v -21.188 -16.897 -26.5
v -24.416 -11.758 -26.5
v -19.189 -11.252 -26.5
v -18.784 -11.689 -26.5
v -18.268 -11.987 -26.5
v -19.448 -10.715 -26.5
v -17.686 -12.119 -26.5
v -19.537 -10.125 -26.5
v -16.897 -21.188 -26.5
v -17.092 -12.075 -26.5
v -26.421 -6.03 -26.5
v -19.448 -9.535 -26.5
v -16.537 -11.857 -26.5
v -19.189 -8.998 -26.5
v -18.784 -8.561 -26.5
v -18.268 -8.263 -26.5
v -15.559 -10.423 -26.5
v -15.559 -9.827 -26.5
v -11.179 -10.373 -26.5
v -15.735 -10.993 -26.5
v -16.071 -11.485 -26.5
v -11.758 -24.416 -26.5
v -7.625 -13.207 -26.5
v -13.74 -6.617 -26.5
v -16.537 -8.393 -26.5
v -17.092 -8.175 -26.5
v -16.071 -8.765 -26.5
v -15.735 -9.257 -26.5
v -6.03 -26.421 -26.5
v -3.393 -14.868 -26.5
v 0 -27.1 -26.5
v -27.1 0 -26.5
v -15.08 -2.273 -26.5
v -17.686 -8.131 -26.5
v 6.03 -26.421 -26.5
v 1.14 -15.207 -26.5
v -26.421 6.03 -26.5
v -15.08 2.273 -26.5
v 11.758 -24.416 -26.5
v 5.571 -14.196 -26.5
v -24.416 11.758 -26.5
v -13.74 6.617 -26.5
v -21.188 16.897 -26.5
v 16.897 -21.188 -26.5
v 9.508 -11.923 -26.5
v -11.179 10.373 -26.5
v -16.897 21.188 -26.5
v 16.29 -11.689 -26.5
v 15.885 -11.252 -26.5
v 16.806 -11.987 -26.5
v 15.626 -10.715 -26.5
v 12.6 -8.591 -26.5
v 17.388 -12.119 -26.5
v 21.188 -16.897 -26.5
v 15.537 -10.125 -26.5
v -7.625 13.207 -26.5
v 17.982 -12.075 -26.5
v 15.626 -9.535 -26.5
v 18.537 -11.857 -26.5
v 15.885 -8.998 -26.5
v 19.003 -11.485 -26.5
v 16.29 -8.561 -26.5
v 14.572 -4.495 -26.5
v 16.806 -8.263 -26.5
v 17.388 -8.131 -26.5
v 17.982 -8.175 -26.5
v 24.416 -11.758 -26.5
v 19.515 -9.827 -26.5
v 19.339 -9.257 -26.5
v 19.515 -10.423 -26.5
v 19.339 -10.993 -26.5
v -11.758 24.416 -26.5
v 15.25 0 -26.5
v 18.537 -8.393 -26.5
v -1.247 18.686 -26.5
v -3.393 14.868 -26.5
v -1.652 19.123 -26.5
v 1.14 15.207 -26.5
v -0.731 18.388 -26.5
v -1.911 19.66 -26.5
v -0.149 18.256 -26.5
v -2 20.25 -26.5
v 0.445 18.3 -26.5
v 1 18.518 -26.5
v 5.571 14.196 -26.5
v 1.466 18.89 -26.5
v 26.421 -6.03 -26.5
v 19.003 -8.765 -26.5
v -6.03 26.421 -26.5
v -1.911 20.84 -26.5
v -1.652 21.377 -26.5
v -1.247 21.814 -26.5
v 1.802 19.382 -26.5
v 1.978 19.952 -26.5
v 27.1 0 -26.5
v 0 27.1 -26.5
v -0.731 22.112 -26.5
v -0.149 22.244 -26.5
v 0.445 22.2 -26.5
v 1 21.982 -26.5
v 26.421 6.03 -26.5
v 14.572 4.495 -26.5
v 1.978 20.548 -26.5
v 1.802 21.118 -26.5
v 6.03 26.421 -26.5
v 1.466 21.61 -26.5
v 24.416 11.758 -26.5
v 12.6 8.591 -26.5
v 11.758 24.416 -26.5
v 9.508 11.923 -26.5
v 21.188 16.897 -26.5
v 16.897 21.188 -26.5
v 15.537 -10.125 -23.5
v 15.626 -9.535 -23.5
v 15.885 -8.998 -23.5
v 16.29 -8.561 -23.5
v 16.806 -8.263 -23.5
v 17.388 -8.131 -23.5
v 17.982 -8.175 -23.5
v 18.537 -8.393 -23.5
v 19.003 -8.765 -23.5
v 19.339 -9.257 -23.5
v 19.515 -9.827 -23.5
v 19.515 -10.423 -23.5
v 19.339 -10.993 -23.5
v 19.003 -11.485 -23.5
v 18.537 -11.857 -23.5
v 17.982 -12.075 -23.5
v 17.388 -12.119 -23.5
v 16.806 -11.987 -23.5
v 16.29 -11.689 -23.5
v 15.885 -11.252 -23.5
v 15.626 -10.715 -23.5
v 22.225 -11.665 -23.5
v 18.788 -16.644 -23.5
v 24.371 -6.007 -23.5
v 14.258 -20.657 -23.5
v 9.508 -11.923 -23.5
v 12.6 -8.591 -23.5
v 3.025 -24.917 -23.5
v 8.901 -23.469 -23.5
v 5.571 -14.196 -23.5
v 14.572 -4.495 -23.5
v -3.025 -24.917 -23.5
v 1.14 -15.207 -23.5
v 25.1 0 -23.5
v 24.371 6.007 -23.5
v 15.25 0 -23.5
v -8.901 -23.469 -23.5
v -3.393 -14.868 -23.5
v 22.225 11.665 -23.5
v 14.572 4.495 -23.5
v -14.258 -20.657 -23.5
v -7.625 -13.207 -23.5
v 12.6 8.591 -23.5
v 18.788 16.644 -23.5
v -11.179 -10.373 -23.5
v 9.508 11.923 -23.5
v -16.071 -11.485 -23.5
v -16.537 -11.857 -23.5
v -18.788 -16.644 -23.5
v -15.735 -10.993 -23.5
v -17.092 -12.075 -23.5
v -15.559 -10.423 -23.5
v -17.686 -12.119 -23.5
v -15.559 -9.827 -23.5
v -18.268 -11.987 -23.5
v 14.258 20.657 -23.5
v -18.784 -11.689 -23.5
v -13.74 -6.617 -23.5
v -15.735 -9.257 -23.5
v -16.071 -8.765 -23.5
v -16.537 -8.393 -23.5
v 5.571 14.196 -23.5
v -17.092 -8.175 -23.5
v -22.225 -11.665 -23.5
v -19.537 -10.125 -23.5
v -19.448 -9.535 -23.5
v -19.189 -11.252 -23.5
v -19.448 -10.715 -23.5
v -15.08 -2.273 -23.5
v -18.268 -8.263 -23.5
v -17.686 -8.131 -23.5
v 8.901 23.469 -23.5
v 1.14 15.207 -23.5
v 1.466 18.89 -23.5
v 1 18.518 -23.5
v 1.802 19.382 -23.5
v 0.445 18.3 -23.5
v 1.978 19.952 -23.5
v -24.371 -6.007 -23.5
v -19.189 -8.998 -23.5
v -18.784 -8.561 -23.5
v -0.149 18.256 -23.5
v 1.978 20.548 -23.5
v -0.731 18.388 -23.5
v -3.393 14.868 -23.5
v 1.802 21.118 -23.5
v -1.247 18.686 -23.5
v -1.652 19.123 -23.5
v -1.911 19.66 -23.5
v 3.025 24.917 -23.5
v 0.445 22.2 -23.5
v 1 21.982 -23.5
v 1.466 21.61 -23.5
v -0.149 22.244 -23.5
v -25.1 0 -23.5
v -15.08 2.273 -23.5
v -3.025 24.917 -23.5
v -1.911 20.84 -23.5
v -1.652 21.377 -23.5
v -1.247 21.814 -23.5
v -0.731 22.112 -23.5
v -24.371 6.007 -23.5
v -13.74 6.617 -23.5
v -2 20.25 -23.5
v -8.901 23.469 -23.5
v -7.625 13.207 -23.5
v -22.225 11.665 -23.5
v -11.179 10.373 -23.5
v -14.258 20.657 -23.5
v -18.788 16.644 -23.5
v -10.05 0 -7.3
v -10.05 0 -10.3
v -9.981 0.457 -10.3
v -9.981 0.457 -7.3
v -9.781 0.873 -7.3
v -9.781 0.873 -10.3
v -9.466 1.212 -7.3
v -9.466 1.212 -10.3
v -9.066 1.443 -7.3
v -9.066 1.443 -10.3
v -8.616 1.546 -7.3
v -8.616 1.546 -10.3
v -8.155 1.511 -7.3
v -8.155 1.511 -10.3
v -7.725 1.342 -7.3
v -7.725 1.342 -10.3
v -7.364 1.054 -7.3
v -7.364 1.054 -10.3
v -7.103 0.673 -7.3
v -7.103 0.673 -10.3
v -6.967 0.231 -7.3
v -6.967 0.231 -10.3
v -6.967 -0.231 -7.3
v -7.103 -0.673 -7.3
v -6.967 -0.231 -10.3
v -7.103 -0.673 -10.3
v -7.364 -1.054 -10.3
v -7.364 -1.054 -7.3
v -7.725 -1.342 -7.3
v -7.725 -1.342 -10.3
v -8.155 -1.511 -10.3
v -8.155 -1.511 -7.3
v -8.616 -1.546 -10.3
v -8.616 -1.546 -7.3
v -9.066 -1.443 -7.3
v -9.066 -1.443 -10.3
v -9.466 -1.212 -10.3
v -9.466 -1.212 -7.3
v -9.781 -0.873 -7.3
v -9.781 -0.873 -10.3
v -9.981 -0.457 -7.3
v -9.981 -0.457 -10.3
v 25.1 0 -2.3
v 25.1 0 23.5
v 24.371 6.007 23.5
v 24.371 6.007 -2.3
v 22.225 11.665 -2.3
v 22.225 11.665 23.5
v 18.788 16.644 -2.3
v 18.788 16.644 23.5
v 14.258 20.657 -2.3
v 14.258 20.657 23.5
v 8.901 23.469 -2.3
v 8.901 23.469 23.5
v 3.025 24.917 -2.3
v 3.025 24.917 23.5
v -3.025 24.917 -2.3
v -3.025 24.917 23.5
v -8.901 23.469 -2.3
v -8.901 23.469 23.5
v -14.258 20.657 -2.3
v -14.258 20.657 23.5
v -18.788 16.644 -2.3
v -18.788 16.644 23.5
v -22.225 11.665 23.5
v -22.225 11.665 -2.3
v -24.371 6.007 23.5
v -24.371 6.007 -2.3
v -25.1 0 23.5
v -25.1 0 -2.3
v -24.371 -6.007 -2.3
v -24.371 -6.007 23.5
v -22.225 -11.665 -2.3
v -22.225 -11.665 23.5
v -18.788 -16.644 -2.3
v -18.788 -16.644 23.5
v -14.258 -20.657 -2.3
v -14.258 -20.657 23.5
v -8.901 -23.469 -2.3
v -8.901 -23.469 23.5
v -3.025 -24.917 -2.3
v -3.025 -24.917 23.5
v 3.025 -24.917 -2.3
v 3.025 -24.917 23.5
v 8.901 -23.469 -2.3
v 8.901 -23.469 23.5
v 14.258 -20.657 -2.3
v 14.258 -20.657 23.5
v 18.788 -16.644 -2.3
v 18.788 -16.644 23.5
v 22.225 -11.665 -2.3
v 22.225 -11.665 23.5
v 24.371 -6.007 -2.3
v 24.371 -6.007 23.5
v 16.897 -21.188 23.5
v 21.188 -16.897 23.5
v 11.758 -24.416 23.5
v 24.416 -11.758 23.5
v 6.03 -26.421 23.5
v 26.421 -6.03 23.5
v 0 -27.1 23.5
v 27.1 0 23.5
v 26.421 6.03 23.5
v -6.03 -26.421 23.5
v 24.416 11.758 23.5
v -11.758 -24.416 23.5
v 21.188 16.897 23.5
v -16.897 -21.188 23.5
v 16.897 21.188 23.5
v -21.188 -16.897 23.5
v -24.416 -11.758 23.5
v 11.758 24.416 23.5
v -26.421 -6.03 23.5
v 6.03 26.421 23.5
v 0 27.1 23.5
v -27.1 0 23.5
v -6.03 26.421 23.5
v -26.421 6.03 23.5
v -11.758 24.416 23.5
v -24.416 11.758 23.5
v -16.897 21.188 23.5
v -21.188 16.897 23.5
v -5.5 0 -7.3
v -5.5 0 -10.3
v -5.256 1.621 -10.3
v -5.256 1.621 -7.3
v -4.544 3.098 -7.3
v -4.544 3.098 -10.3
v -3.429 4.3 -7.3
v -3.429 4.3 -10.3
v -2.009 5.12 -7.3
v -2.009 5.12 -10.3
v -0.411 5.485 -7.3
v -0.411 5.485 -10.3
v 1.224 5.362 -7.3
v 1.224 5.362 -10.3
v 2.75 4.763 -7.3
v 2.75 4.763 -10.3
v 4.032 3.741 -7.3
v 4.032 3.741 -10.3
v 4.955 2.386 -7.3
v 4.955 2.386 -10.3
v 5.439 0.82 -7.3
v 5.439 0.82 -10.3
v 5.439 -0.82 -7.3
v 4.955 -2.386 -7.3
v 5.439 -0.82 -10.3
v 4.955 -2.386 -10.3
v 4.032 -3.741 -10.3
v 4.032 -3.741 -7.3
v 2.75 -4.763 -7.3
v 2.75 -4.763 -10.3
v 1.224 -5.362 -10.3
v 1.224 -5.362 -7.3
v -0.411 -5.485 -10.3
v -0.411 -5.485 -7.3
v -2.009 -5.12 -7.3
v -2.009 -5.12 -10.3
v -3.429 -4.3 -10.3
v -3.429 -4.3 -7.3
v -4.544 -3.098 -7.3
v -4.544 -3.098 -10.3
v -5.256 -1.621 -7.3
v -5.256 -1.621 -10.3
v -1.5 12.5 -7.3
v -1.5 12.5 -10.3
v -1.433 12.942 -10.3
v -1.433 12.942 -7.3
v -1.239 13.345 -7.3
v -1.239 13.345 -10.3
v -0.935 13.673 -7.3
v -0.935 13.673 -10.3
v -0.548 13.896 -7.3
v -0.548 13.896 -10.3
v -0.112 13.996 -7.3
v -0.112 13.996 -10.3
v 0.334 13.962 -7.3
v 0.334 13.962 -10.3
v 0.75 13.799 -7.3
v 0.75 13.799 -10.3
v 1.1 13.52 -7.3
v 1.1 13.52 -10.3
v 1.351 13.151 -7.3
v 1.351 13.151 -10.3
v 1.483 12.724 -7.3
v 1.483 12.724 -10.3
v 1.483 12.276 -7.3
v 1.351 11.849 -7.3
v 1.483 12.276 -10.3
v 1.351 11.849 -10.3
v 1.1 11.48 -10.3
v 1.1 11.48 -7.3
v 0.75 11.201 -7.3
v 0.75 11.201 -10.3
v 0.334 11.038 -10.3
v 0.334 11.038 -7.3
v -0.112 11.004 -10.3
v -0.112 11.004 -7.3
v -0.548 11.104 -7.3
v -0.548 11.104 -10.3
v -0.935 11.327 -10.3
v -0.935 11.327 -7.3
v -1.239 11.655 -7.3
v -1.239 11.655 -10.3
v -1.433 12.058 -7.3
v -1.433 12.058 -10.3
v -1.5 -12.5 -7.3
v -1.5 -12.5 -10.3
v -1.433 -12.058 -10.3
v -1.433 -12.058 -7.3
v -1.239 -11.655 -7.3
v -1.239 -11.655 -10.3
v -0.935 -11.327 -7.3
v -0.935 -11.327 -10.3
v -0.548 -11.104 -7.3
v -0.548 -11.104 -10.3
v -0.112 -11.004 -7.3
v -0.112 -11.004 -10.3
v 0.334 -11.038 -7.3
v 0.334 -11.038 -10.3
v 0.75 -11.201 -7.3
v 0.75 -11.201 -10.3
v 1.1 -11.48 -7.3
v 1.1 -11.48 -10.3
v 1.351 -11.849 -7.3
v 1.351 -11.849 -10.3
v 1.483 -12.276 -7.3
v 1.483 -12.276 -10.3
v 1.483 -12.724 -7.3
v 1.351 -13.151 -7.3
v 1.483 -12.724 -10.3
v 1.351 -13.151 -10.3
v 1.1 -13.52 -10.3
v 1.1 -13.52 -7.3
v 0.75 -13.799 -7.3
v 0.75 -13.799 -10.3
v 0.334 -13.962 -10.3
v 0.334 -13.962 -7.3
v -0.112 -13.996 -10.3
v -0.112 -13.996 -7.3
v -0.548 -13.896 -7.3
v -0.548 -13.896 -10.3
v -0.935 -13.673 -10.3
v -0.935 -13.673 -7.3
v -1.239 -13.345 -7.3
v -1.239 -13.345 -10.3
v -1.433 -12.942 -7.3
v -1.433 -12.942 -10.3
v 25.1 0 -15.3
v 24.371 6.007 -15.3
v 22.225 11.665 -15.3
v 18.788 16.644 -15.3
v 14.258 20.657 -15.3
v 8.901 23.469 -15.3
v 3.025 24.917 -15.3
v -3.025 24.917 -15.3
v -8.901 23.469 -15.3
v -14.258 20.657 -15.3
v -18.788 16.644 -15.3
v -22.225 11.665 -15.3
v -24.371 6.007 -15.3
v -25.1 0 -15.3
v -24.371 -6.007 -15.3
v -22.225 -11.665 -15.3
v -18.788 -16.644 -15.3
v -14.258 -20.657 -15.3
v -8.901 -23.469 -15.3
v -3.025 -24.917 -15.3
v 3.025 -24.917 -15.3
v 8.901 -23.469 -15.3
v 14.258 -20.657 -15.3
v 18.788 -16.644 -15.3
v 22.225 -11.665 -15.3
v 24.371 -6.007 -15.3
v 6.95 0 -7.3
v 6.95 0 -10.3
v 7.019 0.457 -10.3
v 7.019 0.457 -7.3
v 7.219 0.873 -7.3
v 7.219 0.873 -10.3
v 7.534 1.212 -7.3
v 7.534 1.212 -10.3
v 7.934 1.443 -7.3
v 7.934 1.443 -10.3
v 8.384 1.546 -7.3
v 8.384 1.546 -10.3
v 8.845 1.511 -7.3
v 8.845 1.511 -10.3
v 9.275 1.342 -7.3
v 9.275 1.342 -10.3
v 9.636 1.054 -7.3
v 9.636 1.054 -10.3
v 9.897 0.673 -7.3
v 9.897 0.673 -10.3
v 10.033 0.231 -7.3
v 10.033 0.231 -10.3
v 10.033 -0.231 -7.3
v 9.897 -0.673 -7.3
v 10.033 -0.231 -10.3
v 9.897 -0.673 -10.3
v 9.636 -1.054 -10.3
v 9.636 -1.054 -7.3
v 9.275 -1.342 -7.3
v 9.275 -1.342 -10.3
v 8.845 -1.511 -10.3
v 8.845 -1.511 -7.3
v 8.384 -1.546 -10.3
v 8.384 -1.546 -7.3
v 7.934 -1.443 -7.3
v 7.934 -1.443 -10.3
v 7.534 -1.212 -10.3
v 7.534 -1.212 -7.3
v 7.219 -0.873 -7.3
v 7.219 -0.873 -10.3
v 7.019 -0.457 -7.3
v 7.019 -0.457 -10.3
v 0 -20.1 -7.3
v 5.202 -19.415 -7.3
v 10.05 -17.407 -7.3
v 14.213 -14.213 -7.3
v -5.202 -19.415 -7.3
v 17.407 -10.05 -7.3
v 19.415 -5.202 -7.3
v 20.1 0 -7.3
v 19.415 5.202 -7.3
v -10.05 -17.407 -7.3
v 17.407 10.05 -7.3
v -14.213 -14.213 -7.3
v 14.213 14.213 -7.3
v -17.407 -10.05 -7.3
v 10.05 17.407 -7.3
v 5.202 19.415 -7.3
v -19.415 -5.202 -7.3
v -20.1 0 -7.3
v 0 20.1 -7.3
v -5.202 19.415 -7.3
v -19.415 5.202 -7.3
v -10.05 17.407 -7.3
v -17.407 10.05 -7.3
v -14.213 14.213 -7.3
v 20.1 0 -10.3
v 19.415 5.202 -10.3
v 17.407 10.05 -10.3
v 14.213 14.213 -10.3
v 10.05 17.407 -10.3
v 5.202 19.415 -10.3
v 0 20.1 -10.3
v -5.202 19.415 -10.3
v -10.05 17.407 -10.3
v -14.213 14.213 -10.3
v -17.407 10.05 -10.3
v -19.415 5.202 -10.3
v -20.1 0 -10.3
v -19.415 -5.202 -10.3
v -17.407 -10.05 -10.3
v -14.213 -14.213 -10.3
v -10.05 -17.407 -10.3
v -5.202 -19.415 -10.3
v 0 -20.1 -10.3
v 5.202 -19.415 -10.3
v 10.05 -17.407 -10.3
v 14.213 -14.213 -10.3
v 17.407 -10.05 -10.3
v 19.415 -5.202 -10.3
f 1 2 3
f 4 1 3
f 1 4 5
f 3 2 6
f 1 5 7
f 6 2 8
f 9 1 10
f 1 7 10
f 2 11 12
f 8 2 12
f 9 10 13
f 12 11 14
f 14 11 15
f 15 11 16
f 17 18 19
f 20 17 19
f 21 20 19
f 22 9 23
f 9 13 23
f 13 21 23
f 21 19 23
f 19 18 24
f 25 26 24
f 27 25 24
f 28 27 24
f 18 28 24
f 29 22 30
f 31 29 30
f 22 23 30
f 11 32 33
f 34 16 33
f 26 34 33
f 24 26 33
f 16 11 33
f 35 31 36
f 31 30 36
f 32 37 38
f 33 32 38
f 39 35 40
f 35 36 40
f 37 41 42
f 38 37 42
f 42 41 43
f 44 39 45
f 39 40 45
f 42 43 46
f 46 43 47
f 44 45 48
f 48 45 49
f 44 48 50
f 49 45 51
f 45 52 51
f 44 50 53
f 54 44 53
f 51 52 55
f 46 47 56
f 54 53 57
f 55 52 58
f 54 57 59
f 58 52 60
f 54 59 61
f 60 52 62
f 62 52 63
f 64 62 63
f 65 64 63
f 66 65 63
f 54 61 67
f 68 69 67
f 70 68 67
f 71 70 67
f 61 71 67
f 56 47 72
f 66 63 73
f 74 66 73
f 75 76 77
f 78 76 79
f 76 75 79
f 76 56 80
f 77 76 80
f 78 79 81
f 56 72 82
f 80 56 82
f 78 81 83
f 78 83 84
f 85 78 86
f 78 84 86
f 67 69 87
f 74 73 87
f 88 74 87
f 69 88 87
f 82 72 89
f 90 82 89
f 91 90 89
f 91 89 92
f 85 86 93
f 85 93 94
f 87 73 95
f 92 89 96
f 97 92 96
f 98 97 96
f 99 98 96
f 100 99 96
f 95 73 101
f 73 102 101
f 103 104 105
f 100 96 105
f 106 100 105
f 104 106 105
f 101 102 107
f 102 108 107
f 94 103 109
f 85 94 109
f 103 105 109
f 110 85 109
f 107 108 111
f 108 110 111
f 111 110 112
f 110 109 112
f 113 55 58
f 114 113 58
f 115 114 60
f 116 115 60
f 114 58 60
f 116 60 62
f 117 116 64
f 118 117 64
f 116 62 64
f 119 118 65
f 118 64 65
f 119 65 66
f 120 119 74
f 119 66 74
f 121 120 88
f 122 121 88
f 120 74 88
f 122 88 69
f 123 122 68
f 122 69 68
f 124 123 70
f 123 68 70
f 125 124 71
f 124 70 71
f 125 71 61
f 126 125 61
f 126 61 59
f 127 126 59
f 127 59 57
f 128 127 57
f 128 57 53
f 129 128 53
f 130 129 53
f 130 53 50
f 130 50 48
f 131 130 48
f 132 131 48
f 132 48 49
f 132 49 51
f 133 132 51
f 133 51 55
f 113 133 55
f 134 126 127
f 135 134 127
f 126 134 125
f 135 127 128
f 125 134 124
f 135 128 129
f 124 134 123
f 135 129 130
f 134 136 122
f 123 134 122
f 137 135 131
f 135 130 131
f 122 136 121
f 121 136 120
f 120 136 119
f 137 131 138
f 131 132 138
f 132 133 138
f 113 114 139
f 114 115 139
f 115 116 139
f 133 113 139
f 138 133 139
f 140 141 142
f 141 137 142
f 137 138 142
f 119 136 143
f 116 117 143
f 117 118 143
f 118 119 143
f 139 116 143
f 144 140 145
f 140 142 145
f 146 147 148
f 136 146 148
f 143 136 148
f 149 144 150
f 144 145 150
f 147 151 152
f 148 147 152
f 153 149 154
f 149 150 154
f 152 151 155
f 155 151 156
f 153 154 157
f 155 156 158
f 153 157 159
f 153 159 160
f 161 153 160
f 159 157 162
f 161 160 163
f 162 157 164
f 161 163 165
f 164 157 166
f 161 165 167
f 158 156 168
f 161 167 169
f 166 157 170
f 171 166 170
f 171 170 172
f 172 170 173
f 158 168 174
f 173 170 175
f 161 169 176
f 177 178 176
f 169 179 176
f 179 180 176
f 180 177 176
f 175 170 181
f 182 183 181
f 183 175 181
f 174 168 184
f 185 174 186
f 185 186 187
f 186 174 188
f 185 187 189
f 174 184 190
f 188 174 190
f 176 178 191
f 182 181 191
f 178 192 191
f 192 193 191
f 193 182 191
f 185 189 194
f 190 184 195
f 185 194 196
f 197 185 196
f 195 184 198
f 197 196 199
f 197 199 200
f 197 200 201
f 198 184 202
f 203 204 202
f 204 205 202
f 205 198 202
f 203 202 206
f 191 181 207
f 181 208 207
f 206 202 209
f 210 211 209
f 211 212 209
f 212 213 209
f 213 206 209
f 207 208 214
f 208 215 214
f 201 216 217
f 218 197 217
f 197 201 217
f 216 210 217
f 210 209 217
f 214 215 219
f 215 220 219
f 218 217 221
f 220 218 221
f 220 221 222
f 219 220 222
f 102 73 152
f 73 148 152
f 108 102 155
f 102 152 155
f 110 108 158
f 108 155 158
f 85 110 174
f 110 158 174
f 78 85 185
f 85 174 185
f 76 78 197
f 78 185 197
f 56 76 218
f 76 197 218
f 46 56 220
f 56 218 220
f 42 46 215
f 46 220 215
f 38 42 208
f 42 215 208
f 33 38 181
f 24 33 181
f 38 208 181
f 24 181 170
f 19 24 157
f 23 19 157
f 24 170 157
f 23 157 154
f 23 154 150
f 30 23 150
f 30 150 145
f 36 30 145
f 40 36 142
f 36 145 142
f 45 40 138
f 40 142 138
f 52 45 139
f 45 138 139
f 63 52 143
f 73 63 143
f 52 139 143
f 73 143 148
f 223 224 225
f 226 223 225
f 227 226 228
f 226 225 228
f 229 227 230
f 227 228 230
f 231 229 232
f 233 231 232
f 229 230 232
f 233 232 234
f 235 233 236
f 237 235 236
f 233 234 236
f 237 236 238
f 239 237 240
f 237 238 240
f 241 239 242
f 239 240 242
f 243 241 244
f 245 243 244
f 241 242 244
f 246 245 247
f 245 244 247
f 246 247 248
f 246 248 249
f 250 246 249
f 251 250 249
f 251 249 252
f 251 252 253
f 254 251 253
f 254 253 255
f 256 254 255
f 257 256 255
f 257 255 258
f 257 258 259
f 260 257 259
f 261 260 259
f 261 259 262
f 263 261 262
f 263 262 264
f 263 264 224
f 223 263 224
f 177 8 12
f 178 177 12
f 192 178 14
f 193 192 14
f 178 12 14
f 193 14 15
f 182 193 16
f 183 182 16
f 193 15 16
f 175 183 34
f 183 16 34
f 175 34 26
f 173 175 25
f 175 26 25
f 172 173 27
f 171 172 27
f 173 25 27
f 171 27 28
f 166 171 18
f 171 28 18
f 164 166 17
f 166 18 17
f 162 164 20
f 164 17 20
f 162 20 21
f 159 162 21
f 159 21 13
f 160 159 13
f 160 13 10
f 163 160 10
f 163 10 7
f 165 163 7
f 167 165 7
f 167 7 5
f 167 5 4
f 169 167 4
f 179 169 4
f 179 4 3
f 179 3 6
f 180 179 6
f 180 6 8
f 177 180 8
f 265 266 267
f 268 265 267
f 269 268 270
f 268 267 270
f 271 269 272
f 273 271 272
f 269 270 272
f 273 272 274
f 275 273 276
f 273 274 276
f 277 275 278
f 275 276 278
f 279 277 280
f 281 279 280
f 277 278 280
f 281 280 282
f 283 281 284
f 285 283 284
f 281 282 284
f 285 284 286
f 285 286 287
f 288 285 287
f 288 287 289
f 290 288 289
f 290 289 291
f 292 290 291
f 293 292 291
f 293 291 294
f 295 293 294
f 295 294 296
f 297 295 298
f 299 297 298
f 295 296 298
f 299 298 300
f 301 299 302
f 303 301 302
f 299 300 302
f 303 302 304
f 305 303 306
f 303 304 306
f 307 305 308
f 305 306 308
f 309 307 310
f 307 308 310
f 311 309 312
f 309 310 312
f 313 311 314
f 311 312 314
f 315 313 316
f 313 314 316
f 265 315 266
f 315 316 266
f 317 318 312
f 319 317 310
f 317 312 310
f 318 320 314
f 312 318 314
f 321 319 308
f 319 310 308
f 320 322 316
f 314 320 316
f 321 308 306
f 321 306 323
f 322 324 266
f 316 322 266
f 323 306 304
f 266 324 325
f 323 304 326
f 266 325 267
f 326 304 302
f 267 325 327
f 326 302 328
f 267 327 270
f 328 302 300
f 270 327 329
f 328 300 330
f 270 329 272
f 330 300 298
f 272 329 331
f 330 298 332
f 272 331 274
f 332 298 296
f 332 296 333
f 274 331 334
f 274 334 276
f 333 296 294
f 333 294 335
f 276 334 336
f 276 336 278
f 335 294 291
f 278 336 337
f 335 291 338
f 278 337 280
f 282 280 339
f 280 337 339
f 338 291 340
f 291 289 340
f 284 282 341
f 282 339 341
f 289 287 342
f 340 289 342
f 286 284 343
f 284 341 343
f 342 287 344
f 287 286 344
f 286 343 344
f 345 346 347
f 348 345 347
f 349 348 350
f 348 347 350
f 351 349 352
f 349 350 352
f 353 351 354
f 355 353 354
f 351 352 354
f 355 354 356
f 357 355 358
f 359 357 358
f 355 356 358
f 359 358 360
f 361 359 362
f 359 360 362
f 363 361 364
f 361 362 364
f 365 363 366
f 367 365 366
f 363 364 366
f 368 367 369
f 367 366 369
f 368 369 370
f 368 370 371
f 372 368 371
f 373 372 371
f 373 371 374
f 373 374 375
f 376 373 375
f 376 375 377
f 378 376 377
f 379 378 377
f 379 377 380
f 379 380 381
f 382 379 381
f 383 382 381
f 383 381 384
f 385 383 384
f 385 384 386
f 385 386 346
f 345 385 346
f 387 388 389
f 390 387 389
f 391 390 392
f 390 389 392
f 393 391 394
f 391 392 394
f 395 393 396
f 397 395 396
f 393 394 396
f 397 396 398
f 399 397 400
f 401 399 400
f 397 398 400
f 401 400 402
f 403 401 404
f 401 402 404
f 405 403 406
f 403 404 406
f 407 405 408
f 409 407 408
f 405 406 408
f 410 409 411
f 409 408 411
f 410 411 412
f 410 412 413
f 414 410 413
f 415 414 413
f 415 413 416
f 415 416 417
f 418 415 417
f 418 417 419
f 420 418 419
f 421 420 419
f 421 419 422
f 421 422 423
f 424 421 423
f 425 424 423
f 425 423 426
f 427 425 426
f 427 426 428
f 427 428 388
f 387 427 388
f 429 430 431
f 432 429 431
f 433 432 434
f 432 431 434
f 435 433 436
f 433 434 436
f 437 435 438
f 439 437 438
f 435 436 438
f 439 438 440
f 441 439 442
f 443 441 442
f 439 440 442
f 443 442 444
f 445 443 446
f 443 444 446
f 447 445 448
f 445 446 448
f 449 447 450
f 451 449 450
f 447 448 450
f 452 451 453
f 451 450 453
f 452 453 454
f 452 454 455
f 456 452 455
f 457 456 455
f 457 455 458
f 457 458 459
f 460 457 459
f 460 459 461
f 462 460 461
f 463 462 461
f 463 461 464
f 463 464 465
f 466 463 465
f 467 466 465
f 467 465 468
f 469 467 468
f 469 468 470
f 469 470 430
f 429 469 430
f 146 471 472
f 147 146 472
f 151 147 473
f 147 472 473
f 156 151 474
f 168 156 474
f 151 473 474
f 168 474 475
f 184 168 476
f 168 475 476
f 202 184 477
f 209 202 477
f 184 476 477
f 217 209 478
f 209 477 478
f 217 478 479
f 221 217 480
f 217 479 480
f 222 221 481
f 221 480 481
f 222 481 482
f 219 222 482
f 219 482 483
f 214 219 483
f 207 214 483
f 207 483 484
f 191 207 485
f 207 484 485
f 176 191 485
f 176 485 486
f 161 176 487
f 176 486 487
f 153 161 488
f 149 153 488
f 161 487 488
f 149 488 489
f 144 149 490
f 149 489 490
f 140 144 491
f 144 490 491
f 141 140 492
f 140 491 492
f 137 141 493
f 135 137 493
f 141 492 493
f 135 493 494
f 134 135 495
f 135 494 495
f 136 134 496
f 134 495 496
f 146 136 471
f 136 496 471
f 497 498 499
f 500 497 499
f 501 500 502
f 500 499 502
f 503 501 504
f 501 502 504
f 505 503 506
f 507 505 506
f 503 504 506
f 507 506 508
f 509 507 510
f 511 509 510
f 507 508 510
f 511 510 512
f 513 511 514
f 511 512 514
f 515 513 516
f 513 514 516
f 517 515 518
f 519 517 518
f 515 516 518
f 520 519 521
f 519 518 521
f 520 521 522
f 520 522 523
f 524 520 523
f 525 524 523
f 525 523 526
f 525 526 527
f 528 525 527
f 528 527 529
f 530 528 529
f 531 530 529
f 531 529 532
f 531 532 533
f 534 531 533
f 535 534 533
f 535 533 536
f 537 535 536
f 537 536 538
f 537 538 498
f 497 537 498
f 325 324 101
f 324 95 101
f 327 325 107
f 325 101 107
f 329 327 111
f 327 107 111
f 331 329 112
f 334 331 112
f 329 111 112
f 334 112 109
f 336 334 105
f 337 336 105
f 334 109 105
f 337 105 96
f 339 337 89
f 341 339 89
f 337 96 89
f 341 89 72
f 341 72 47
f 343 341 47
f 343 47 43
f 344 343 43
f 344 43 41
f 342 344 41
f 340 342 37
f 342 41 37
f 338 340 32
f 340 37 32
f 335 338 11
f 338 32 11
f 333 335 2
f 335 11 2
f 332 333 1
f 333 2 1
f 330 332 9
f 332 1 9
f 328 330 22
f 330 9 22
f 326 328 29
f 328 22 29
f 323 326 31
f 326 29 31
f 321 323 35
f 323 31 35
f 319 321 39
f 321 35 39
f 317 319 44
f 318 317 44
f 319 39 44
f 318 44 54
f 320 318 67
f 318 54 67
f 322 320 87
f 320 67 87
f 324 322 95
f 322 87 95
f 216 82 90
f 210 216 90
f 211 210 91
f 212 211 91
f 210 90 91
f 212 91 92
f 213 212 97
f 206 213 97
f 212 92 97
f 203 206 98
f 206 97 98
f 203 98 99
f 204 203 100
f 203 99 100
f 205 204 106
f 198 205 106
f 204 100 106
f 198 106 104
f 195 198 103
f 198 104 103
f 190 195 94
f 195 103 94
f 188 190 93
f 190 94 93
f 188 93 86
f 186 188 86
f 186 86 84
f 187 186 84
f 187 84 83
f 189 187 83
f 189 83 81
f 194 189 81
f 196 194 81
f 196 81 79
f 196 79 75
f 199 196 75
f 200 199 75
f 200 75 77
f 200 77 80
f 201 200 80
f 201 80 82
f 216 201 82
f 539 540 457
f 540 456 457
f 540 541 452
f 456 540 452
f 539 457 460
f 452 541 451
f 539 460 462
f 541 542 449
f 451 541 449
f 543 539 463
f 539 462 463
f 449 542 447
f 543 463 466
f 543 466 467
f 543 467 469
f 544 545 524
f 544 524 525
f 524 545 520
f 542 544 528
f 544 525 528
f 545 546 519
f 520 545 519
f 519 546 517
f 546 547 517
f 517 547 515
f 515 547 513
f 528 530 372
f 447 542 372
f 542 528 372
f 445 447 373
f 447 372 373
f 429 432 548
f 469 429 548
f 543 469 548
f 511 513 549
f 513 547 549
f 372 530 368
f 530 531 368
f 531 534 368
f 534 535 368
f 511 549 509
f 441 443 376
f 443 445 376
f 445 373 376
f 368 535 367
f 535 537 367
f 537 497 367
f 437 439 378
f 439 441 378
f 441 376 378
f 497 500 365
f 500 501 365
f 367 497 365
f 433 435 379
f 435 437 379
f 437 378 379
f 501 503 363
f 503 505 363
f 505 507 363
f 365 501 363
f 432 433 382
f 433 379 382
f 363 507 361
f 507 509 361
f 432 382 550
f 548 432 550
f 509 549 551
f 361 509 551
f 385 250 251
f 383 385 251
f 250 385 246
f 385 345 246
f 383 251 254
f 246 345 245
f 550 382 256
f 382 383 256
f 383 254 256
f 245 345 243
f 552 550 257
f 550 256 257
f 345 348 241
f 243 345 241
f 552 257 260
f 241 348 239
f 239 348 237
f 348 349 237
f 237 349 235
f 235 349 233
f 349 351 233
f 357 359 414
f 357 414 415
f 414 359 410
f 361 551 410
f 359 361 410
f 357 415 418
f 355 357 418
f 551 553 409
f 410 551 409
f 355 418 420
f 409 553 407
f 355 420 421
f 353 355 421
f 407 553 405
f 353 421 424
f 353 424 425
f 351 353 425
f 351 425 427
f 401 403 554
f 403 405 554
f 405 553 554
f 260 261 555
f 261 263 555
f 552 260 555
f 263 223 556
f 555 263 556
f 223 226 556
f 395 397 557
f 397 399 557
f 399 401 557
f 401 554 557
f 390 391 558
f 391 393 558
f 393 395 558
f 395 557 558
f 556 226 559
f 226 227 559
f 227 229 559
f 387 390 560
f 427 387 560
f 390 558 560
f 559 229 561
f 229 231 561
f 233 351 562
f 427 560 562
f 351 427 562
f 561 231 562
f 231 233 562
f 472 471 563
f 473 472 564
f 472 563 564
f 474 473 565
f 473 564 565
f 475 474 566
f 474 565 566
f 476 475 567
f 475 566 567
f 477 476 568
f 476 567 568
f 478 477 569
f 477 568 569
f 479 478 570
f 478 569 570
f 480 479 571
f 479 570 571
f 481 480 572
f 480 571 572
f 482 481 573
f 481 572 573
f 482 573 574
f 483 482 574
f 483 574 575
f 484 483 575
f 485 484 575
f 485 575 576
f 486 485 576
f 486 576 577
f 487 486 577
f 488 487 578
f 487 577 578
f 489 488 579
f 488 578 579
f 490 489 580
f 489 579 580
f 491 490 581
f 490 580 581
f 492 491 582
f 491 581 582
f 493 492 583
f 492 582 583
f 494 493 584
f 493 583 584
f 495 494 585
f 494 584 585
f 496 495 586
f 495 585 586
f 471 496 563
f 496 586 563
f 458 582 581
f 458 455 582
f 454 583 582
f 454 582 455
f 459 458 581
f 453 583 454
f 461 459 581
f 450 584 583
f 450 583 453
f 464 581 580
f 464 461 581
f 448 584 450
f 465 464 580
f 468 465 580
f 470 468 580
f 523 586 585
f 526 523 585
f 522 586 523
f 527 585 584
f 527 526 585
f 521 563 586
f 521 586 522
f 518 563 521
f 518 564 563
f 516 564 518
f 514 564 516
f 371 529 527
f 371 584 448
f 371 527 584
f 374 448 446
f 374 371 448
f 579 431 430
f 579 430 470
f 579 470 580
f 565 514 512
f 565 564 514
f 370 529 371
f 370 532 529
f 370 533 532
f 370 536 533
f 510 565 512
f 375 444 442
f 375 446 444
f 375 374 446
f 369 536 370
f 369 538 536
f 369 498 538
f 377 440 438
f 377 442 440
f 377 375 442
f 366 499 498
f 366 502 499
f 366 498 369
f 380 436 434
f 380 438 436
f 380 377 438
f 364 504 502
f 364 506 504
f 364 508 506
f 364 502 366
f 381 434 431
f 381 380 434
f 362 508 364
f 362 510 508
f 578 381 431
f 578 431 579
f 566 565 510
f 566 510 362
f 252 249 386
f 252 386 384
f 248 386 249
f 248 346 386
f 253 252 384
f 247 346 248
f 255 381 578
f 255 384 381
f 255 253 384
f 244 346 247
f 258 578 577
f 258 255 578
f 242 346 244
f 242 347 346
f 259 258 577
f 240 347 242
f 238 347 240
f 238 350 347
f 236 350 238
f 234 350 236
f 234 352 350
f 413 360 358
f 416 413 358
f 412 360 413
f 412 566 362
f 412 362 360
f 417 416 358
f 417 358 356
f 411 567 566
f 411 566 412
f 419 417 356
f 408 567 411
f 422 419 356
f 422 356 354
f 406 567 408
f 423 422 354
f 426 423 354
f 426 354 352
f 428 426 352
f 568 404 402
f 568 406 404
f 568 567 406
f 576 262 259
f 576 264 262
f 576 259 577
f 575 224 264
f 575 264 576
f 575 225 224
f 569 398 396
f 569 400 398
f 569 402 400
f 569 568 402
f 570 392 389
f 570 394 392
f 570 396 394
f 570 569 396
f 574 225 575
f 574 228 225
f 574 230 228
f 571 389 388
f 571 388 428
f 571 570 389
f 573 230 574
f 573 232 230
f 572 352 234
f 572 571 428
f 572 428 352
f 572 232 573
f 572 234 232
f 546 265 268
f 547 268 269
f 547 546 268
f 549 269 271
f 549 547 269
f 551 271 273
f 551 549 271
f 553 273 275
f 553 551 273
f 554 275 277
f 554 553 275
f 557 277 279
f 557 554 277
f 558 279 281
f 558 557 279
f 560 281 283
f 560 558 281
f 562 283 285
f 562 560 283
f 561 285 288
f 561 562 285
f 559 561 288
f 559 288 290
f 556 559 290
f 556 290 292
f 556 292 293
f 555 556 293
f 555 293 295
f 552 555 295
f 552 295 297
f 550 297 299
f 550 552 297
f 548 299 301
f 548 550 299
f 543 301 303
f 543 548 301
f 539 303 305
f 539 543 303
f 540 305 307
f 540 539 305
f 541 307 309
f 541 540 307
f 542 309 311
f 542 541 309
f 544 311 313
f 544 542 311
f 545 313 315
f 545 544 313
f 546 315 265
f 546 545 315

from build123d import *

# Parameters (mm, degrees)
SKETCH2_R          = 2
CUT_EXTRUDE1_DEPTH = 10
SKETCH3_W          = 25.1
SKETCH3_H          = 3
CHAMFER1_SIZE      = 5
SKETCH4_R          = 1.5
SKETCH4_R_2        = 1.55
SKETCH4_R_3        = 5.5
CUT_EXTRUDE2_DEPTH = 10


with BuildPart() as part:
    # Sketch1 → Revolve1 (revolve)
    with BuildSketch(Plane(origin=(0, 0, 0), x_dir=(1, 0, 0), z_dir=(0, 1, 0))):
        Polygon((15.25, 26.5), (15.25, 23.5), (25.1, 23.5), (25.1, -23.5), (27.1, -23.5), (27.1, 26.5), align=None)
    revolve(axis=Axis((0, 0, -51.288157895), (0, 0, 1)))

    # Sketch2 → Cut-Extrude1 (cut)
    with BuildSketch(Plane(origin=(0, 0, -26.5), x_dir=(-1, 0, 0), z_dir=(0, 0, -1))):
        with Locations((0, 20.25)):
            Circle(SKETCH2_R)
        with Locations((17.537014427, -10.125)):
            Circle(SKETCH2_R)
        with Locations((-17.537014427, -10.125)):
            Circle(SKETCH2_R)
    extrude(amount=-CUT_EXTRUDE1_DEPTH, mode=Mode.SUBTRACT)

    # Sketch3 → Revolve2 (revolve)
    with BuildSketch(Plane(origin=(0, 0, 0), x_dir=(1, 0, 0), z_dir=(0, 1, 0))):
        with Locations((12.55, 8.8)):
            Rectangle(SKETCH3_W, SKETCH3_H)
    revolve(axis=Axis((0, 0, -51.288157895), (0, 0, 1)))

    # Chamfer1
    chamfer1_edges = [part.edges().sort_by_distance(p)[0] for p in [
        (-25.1, 0, -7.3),
        (-25.1, 0, -10.3),
    ]]
    chamfer(chamfer1_edges, length=CHAMFER1_SIZE)

    # Sketch4 → Cut-Extrude2 (cut)
    with BuildSketch(Plane(origin=(0, 0, -10.3), x_dir=(-1, 0, 0), z_dir=(0, 0, -1))):
        with Locations((0, 12.5)):
            Circle(SKETCH4_R)
        with Locations((0, -12.5)):
            Circle(SKETCH4_R)
        with Locations((-8.5, 0)):
            Circle(SKETCH4_R_2)
        with Locations((8.5, 0)):
            Circle(SKETCH4_R_2)
        Circle(SKETCH4_R_3)
    extrude(amount=-CUT_EXTRUDE2_DEPTH, mode=Mode.SUBTRACT)


solid = part.part
